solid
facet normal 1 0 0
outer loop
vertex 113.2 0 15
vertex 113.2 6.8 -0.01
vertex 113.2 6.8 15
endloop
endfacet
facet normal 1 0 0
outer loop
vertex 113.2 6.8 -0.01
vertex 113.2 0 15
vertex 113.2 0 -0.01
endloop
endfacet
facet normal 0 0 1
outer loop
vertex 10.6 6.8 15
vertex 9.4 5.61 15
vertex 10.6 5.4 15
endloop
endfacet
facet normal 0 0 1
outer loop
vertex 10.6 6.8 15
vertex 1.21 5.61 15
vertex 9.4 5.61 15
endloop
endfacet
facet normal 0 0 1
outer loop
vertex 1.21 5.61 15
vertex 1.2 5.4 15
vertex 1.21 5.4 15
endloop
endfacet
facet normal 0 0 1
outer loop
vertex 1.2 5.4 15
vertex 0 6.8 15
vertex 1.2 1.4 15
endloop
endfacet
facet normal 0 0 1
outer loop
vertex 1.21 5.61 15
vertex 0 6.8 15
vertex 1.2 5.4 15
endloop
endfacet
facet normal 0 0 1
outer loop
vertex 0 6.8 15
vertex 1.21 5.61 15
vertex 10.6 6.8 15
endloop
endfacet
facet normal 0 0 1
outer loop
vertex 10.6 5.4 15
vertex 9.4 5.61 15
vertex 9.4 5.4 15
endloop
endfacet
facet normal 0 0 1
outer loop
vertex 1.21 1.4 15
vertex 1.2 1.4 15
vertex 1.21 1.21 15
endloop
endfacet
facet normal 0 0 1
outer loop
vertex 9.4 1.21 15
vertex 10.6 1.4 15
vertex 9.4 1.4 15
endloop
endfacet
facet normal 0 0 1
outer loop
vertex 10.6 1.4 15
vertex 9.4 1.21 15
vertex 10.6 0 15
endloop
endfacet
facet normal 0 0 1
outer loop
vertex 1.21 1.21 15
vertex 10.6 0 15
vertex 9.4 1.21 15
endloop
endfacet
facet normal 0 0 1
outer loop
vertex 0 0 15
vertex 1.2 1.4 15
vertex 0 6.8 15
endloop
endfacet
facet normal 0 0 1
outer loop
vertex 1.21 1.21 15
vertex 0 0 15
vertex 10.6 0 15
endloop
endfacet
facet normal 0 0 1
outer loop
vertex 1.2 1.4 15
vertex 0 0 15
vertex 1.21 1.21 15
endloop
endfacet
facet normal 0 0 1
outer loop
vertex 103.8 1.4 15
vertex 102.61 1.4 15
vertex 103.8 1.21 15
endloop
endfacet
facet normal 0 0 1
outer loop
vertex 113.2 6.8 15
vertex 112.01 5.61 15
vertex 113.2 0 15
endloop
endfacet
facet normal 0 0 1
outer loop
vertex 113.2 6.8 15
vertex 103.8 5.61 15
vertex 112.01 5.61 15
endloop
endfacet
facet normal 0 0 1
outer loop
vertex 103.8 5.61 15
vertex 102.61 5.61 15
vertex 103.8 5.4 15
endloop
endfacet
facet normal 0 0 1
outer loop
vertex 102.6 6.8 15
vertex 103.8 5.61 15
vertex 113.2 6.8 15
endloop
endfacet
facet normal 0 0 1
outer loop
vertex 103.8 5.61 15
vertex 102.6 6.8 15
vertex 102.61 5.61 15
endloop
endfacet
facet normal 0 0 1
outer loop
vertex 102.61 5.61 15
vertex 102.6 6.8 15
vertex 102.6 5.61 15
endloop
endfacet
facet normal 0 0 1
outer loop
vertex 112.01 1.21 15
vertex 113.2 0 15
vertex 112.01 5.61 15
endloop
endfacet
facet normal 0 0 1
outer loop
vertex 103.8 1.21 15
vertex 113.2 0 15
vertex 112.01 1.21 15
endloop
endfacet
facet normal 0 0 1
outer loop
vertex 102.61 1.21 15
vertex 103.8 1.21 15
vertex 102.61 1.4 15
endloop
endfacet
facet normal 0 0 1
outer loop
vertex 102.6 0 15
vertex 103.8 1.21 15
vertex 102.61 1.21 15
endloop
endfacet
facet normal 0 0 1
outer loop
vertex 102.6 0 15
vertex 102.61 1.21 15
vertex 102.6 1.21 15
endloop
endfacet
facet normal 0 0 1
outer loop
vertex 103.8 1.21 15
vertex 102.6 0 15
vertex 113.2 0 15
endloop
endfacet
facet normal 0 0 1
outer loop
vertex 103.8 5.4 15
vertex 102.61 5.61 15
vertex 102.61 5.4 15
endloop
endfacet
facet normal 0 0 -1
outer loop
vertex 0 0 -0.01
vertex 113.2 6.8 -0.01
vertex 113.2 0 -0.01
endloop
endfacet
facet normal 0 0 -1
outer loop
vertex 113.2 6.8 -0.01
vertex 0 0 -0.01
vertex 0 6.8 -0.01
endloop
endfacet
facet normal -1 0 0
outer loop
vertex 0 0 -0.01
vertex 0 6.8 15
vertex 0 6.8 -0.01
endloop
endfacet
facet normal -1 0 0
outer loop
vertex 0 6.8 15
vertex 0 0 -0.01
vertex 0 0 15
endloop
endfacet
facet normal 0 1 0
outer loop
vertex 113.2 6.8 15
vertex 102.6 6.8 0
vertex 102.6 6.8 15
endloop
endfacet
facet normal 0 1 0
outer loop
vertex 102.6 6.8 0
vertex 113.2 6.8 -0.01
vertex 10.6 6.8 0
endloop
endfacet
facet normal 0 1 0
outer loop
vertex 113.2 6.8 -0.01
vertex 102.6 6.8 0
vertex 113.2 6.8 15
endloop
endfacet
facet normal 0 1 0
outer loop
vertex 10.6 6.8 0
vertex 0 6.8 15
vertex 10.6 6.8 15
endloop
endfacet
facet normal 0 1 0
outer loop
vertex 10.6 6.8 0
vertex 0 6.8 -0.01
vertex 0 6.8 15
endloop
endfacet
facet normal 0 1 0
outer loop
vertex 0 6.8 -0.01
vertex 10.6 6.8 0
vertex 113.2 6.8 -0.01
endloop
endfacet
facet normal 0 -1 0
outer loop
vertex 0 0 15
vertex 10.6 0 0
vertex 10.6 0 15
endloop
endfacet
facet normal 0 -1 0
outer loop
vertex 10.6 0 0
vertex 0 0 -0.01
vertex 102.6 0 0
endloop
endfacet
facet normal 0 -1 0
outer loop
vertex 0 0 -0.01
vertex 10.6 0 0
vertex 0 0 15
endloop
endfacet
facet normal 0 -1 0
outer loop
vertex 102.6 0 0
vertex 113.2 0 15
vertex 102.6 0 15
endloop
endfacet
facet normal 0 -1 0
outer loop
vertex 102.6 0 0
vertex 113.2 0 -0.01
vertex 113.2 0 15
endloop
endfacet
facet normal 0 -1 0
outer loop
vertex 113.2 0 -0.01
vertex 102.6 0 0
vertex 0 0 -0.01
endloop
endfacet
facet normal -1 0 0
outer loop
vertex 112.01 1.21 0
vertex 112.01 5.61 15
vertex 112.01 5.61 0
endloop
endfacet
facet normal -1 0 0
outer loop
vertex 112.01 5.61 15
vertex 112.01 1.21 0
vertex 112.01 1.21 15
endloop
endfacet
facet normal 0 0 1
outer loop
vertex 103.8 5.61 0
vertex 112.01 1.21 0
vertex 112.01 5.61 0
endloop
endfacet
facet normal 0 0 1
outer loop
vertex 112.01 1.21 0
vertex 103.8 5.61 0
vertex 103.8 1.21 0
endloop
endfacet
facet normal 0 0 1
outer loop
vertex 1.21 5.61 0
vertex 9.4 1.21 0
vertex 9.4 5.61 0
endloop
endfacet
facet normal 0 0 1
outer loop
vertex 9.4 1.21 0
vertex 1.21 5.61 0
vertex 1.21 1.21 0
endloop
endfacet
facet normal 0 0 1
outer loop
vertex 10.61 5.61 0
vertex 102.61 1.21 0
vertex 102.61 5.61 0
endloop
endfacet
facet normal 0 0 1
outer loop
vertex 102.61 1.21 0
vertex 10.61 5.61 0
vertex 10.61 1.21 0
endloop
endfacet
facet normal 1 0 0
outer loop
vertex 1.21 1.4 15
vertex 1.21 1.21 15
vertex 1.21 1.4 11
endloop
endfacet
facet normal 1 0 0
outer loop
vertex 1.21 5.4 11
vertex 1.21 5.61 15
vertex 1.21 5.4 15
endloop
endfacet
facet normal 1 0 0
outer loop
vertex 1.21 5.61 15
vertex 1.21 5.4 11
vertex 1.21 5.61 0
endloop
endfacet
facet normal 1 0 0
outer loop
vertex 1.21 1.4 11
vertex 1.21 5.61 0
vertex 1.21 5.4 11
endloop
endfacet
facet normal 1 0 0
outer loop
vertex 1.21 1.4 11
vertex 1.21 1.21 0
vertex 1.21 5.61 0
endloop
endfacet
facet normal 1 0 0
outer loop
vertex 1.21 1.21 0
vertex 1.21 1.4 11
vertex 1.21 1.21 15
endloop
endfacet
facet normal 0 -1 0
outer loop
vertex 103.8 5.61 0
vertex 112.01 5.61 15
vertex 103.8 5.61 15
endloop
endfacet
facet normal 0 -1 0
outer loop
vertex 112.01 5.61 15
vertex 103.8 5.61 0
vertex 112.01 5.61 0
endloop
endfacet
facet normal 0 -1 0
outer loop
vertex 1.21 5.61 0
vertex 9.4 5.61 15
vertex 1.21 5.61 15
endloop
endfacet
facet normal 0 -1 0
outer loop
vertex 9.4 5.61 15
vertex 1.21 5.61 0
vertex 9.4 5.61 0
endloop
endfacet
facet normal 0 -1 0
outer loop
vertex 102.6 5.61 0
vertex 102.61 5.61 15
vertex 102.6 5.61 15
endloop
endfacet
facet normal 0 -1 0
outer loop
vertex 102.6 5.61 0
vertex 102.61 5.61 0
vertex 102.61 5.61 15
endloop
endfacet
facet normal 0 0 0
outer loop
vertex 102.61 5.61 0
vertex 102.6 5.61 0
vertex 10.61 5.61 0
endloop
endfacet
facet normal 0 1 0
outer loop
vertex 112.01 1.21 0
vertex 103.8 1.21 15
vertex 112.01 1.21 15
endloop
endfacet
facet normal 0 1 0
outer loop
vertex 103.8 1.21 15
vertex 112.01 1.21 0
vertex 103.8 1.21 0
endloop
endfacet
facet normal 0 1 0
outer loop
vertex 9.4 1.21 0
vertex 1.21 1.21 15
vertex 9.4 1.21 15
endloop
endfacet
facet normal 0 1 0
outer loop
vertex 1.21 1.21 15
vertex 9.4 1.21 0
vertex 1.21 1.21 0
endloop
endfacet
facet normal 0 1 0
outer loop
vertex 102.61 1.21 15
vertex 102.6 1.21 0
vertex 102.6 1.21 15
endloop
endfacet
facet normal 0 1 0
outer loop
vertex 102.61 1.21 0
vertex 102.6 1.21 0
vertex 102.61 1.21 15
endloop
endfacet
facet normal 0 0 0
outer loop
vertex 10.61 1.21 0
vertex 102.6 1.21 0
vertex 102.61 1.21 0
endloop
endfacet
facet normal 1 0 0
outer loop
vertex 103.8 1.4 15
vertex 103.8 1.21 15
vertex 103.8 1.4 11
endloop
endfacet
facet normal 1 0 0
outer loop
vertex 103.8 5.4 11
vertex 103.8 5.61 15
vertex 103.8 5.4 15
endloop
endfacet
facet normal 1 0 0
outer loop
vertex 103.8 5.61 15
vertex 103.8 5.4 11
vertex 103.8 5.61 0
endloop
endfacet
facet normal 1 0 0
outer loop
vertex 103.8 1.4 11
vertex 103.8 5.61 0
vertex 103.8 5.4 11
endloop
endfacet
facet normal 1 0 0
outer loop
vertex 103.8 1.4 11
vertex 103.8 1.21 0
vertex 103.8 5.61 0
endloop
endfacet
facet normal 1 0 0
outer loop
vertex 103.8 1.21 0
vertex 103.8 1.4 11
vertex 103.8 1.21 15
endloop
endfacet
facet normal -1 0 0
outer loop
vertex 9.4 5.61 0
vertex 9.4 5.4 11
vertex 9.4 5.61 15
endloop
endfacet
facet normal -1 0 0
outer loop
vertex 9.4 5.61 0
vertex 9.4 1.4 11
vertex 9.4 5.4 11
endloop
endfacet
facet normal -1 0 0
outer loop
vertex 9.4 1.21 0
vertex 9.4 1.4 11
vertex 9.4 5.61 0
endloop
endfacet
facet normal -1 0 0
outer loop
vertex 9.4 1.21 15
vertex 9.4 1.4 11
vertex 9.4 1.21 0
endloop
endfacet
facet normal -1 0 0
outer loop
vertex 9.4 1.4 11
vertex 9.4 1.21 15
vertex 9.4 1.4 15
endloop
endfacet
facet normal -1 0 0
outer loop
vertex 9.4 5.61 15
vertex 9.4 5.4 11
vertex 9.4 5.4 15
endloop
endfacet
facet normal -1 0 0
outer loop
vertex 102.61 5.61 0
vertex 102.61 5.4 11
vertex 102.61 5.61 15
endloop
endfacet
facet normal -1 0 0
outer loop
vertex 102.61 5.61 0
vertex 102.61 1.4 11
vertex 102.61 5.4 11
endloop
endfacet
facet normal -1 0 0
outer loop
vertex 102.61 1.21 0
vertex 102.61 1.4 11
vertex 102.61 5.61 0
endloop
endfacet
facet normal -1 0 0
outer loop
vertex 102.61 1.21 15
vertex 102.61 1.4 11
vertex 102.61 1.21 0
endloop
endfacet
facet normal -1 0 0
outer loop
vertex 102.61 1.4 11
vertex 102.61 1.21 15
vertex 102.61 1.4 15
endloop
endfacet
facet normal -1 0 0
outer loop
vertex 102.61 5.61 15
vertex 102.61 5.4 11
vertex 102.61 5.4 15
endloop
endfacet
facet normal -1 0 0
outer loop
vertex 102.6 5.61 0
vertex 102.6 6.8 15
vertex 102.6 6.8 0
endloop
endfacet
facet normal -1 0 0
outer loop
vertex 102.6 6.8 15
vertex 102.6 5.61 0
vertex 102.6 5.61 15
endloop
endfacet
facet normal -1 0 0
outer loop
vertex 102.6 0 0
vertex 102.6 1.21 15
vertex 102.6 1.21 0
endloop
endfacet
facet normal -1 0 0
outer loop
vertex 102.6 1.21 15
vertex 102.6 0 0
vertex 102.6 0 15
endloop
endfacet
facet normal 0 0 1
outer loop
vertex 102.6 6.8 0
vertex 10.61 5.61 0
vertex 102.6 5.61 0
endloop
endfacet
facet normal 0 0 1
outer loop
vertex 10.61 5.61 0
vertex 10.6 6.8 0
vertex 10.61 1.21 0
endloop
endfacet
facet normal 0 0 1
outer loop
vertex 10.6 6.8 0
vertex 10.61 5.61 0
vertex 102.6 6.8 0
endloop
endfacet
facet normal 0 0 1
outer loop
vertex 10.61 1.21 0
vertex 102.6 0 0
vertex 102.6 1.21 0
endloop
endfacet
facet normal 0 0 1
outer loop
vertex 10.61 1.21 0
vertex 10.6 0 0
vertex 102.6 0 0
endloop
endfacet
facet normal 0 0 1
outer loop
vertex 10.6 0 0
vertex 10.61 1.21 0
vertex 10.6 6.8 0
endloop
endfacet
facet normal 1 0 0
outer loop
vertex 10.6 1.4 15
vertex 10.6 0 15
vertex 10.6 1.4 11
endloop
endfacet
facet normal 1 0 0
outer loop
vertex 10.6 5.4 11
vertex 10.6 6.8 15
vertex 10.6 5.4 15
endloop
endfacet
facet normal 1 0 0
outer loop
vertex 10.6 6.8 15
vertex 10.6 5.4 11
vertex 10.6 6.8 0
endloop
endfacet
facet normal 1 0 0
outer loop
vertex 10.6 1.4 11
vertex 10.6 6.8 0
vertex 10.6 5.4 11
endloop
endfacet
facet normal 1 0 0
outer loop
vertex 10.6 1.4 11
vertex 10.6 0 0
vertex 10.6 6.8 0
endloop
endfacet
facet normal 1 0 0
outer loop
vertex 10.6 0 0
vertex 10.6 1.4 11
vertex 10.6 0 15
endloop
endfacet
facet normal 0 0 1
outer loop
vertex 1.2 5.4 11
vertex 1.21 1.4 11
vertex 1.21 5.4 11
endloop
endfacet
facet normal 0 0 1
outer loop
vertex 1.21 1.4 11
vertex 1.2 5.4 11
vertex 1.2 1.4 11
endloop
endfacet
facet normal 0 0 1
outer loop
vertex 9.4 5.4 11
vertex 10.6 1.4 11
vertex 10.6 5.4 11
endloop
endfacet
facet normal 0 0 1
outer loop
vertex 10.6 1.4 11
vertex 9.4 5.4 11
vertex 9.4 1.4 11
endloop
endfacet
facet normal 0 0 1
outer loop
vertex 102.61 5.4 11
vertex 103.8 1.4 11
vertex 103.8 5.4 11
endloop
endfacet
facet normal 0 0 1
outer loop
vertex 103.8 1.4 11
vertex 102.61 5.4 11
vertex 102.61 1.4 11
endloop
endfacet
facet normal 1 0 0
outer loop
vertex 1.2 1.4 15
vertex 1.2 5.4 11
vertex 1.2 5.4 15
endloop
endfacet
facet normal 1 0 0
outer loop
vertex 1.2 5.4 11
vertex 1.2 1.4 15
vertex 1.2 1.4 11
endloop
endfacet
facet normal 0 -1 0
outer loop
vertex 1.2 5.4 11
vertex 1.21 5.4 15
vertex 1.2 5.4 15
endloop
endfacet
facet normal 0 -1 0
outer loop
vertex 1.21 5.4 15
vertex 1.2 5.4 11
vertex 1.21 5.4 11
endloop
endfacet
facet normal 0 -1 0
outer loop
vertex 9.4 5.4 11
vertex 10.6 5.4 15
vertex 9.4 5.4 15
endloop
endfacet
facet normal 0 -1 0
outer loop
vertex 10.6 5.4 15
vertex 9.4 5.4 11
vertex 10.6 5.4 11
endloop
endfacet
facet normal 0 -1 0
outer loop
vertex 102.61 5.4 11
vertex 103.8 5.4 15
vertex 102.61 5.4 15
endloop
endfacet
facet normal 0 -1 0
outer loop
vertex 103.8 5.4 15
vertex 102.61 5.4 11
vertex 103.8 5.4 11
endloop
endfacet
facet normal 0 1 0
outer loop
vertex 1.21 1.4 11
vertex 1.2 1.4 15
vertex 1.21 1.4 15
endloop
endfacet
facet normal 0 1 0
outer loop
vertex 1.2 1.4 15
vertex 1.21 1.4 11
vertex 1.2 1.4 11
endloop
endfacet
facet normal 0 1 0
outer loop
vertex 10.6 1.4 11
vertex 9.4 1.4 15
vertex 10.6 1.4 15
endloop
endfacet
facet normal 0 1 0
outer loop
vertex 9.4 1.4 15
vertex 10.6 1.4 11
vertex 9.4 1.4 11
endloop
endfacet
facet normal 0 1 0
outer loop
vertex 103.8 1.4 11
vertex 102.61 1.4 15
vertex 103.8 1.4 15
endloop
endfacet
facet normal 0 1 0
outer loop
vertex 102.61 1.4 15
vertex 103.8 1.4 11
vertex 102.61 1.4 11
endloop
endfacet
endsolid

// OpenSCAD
// file: ../Base/Boxes.scad
// Fischertechnik Box Foundation
// Pre-designed Boxes

use <Constants.scad>

include <PlacementOptions.scad>

box190Width = 190;
box190Depth = 130;
box130Width = 130;
box130Depth = 95;

// Values are from an original ec3 box
topBottomDifference = 1.5;
outerHeight = 40;
innerHeight = 38.2;
baseThickness = outerHeight - innerHeight;
stackExcess = 5.7;
radius = 3.5;
wallThickness = 1.5;
tolerance = 0.2;
stackOffset = innerHeight - stackExcess;

boxUsageHeight = stackOffset;
boxWallThickness = wallThickness;
boxBaseThickness = baseThickness;
boxWebWidth = 3.0;

// getBoxWallThickness()
// Gets the wall thickness of a Fischertechnik Box
function getBoxWallThickness() = boxWallThickness;

// getBoxUsageHeight()
// Gets the usable height of a Fischertechnik box
function getBoxUsageHeight() = boxUsageHeight;

// getBoxInnerHeight()
// Gets the inner height of a Fischertechnik box, including the stack excess
function getBoxInnerHeight() = innerHeight;

// getBoxBaseThickness()
// Gets the thickness of the Fischertechnik box base.
function getBoxBaseThickness() = boxBaseThickness;

// getBoxWebWidth()
// Gets the width of a box web
function getBoxWebWidth() = boxWebWidth;

// getBox190Space()
// Gets the usable inner space of a Box 190 as an x/y-list
function getBox190Space() = [
    box190Width - 2*getBoxWallThickness() - topBottomDifference, 
    box190Depth - 2*getBoxWallThickness() - topBottomDifference ];

// BoxBase(width, depth)
// Creates an empty stackable Fischertechnik compatible box
// width = Outer width of the box (190, 130, ...)
// depth = Outer depth of the box (130, 95, ...)

module BoxBase(width, depth, height=outerHeight) {    
    thinPlate = 0.01;

    innerHeight = height - baseThickness;    
    
    module BodyPlate(width, depth) {
        translate([radius, radius])
        hull() {
            w = width-2*radius;
            d = depth-2*radius;
            cube([w, d, thinPlate]);
            cylinder(thinPlate, r=radius, $fn=getFragments());
            translate([w, 0])
                cylinder(thinPlate, r=radius, $fn=getFragments());
            translate([w, d])
                cylinder(thinPlate, r=radius, $fn=getFragments());
            translate([0, d])
                cylinder(thinPlate, r=radius, $fn=getFragments());
        }
    }
    
    module Body(tolerance=tolerance) {
        hull() {
            // Bottom with tolerance to fit into the original boxes when stacked
            translate([-wallThickness+tolerance, -wallThickness+tolerance, -baseThickness])
                BodyPlate(width-topBottomDifference-2*tolerance, depth-topBottomDifference-2*tolerance);
            
            // Top
            translate([-wallThickness-topBottomDifference/2, -wallThickness-topBottomDifference/2, innerHeight-thinPlate])
                BodyPlate(width, depth);
         }
    }

    module Cutoff() {
        hull() {
            coWidth = width - 2*wallThickness;
            coDepth = depth - 2*wallThickness;
            
            // Bottom
            BodyPlate(coWidth-topBottomDifference, coDepth-topBottomDifference);

            // Top
            translate([-topBottomDifference/2, -topBottomDifference/2, innerHeight+thinPlate]) 
                BodyPlate(coWidth, coDepth);
        }
    }
    
    difference() {        
        Body();
        Cutoff();
        stackOffset = innerHeight - stackExcess;
        translate([0, 0, stackOffset + baseThickness])
            Body(tolerance=0);
    }
}

// Creates the Fischertechnik empty box 130x190 mm and places it at position 0,0
// 190x130 are the outer sizes, the inner space is slightly smaller. Use getBox190Space() to get the inner sizes.
// The box is positioned that the usable inner space is at the 0,0,0 position. The

module Box190() {
    BoxBase(box190Width, box190Depth);
}

// Gets the usable inner space of a Box 130 as an x/y-list
function getBox130Space() = [
    box130Width - 2*getBoxWallThickness() - topBottomDifference, 
    box130Depth - 2*getBoxWallThickness() - topBottomDifference ];

// Creates the Fischertechnik empty box 95x130 mm and places it at position 0,0
// 190x130 are the outer sizes, the inner space is slightly smaller. Use getBox190Space() to get the inner sizes.
// The box is positioned that the usable inner space is at the 0,0,0 position. The

module Box130() {
    BoxBase(box130Width, box130Depth);
}

// Creates a web at the specified box walls
// corner 0 = LowerLeft, 1 = UpperLeft, 2 = UpperRight, 3 = LowerRight
// side 0 = LeftOfCorner, 1 = RightOfCorner
// distance = Distance in mm from the corner
// boxSpace = inner width and depth of the box (default: Box 190)
// webWidth = length of the web (default is 3 mms)
// webThickness = thickness of the web (default is 1 mm)

module BoxWeb(corner, side, distance, boxSpace=getBox190Space(), webWidth=getBoxWebWidth(), webThickness=1.0) {
    sink = getBoxWallThickness()/2;

    width = (corner % 2 == 0) ? 
            (side == LeftOfCorner ? webWidth : webThickness) :
            (side == LeftOfCorner ? webThickness : webWidth);

    depth = (corner % 2 == 0) ? 
            (side == RightOfCorner ? webWidth : webThickness) :
            (side == RightOfCorner ? webThickness : webWidth);
    
    xDiff = corner == LowerLeft ? 
                (side == LeftOfCorner ? -sink : distance) :
            (corner == UpperLeft ?                
                (side == LeftOfCorner ? distance : -sink) :
            (corner == UpperRight ?
                (side == LeftOfCorner ? boxSpace.x-webWidth+sink : boxSpace.x-distance-webThickness) :
                (side == LeftOfCorner ? boxSpace.x-distance-webThickness: boxSpace.x-webWidth+sink)));

    yDiff = corner == LowerLeft ? 
                (side == RightOfCorner ? -sink : distance) :
            (corner == UpperLeft ?
                (side == RightOfCorner ? boxSpace.y-distance : boxSpace.y-webWidth+sink) :
            (corner == UpperRight ?
                (side == RightOfCorner ? boxSpace.y-webWidth+sink : boxSpace.y-distance) :
                (side == RightOfCorner ? distance : -sink)));
    
    translate([xDiff, yDiff, -getExcess()])
        cube([width, depth, boxUsageHeight + 2*getExcess()]);
}
// file: ../Base/Rotation.scad
// Fischertechnik Box Foundation
// Geometry Helpers Rotation

include <PlacementOptions.scad>

// getRotatedSpace(space, rotation=NoRotation)
// Rotates the space dependent on the specified rotation

function getRotatedSpace(space, rotation=NoRotation) = [
    (rotation == Rotate90 || rotation == Rotate270) ? space.y : space.x,
    (rotation == Rotate90 || rotation == Rotate270) ? space.x : space.y
];

// Rotates the given space around the fixed left lower corner
// space = the space the children needs as width/depth list [width,depth]
// rotation = 0 Rotate0 degrees, 1 Rotate90 degrees, 2 Rotate180 degrees, 3 Rotate270 degrees (equivalent to -90)

module RotateFix(space, rotation=NoRotation) {
    dy = (rotation == Rotate0 || rotation == Rotate270) ? 0 :
        (rotation == Rotate90) ? space.x :
        space.y;
    dx = (rotation < Rotate180) ? 0 :
        (rotation == Rotate180) ? space.x :
        space.y;
    
    translate([dx, dy, 0])
        rotate([0, 0, rotations[rotation]])
            children();
}
// file: ../Base/Alignment.scad
// Fischertechnik Box Foundation
// Geometry Helpers Alignment

include <PlacementOptions.scad>

// getAlignedX(elementWidth, spaceWidth, align=AlignRight, offset=0)
// Gets the aligned X offset of an element with the given
// width in the given space.
// elementWidth = The width of the element to positon
// spaceWidth = The space where the element should be aligned
// align = 0 AlignLeft, 1 AlignCenter, 2 AlignRight
// offset = an optional offset from the aligned position. When
// aligned left or centered, then positive values are in X direction.
// When aligned right then positive values are in negative X direction.

function getAlignedX(elementWidth, spaceWidth, align=AlignRight, offset=0) =
    (align == AlignLeft) ?
        offset :
        ((align == AlignCenter) ?
        (spaceWidth - elementWidth)/2 + offset :
        spaceWidth - offset - elementWidth);

// getAlignedY(elementDepth, spaceDepth, align=AlignTop, offset=0)
// Gets the aligned Y offset of an element with the given
// depth in the given space.
// elementDepth = The depth of the element to positon
// spaceDepth = The space where the element should be aligned
// align = 0 AlignBottom, 1 AlignCenter, 2 AlignTop
// offset = an optional offset from the aligned position. When
// aligned bottom or centered, then positive values are in Y direction.
// When aligned top then positive values are in negative Y direction.

function getAlignedY(elementDepth, spaceDepth, align=AlignTop, offset=0) =
    (align == AlignBottom) ?
        offset :
        ((align == AlignCenter) ?
        (spaceDepth - elementDepth)/2 + offset :
        spaceDepth - offset - elementDepth);
// file: ../Base/PlacementOptions.scad
// Fischertechnik Box Foundation
// Placement Options

// Alignment
NoAlign = 0;
AlignLeft = 1;
AlignBottom = 2;
AlignCenter = 3;
AlignRight = 4;
AlignTop = 5;

// Element rotation degree steps
rotations = [0, -90, -180, -270];

// Rotation
NoRotation = 0;
Rotate0 = 0;
Rotate90 = 1;
Rotate180 = 2;
Rotate270 = 3;

// Docking (seen from above)
NoDock = -1;
DockLeft = 0;
DockTop = 1;
DockRight = 2;
DockCorner = 2;
DockBottom = 3;

// Web corners
LowerLeft = 0;
UpperLeft = 1;
UpperRight = 2;
LowerRight = 3;

// Web position relative to corner
LeftOfCorner = 0;
RightOfCorner = 1;
// file: ../Base/Placement.scad
// Fischertechnik Box Foundation
// Geometry Helpers Placement

use <Constants.scad>
use <Alignment.scad>
use <Rotation.scad>
use <Boxes.scad>

include <PlacementOptions.scad>

// Place(x=0, y=0, elementSpace=[0,0], alignX=AlignLeft, alignY=AlignBottom, rotation=Rotate0, boxSpace=getBox190Space())
// Places the child at the specified position
// y = Y-Position. This is a relative position when an X aligment is specified.
// x = X-Position. This is a relative position when an Y aligment is specified.
// elementSpace = space of the element to be placed [x,y]
// alignX = -1=NoAlign, 0 AlignLeft, 1 AlignCenter, 3 AlignRight (elementSpace and boxSpace required!)
// alignY = -1=NoAlign, 2 AlignBottom, 1 AlignCenter, 4 AlignTop (elementSpace and boxSpace required!)
// rotation = 0 Rotate0 0 degrees, 1 Rotate90 90 degrees, 
// 2 Rotate180 180 degrees, 3 Rotate270 270 degrees (equivalent to -90)
// boxSpace = Inner space of the box where the placement occurs [x,y] - default is Box 190x130 inner space

module Place(x=0, y=0, elementSpace=[0,0], 
  alignX=AlignLeft, alignY=AlignBottom, 
  rotation=NoRotation, boxSpace=getBox190Space()) {

    module Position(x, y, space, rotation=Rotate0) {
        translate([x, y, 0])
            RotateFix(space, rotation)
                children();
    }

    space = getRotatedSpace(elementSpace, rotation);
    alignedX = getAlignedX(space.x, boxSpace.x, alignX, x);
    alignedY = getAlignedY(space.y, boxSpace.y, alignY, y);
    Position(alignedX, alignedY, elementSpace, rotation)
        children();
}

// Center(space=getBox130Space(), elementSpace=[0,0])
// space = Space where the children is centered. For cylinder use centered=true and no elementSpace.
// elementSpace = space of the element to be centered [x,y]

module Center(space=getBox190Space(), elementSpace=[0,0]) {
    Place(elementSpace=elementSpace, boxSpace=space, alignX=AlignCenter, alignY=AlignCenter)
        children();
}

// CenterHorizontal(width=0, y=0, offset=0, space=getBox130Space())
// width = Width of the element to be placed.
// y = Y position of the element
// offset = Offset from the center position (negative will be left of the center)
// space = Space where the element is placed

module CenterHorizontal(width=0, y=0, offset=0, space=getBox190Space()) {
    Place(x=offset, y=y, elementSpace=[width, 0], boxSpace=space, alignX=AlignCenter)
        children(0);
}

// CenterVertical(depth=0, x=0, offset=0, space=getBox130Space())
// depth = Depth of the element to be placed.
// x = X position of the element
// offset = Offset from the center position (negative will be down of the center)
// space = Space where the element is placed

module CenterVertical(depth=0, x=0, offset=0, space=getBox190Space()) {
    Place(x=x, y=offset, elementSpace=[0, depth], boxSpace=space, alignY=AlignCenter)
        children(0);
}

// getIsVertical(align)
// True if the specified alignment needs a vertical orientation for a divider (AlignRight, AlignLeft)

function getIsVertical(align) = (align == AlignRight || align == AlignLeft);

// getIsHorizontal(align)
// True if the specified alignment needs a horizontal orientation for a divider (AlignTop, AlignBottom)

function getIsHorizontal(align) = (align == AlignTop || align == AlignBottom);
// file: ../Base/Constants.scad
// Fischertechnik Box Foundation
// Constants

// Constant values necessary for multiple elements

// Base constants
dividerThickness = 1.2;
excess = 0.01;
fragments = 90;
tolerance = 0.8;

// Gets the thickness of a divider 
function getDividerThickness() = dividerThickness;

// Gets the excess that is used to merge walls into each other
function getExcess() = excess;

// Gets amount of fragments of a cylinder
function getFragments() = fragments;

// Gets the inner tolerance of a frame to each side
function getTolerance() = tolerance;


// Fischertechnik specific constants
axisDiameter = 4;
axisBottomDiameter = axisDiameter + 1;
standardEdgeDistance = 2.5;
standardWebDistance = 11.5;
standardCornerLength = 15;
tubeWallFactor = 0.8;
smallPartsFrameHeight = 20;

// Gets axis diameter
function getAxisDiameter() = axisDiameter;

// Gets axis bottom diameter for thicker part at the bottom
function getAxisBottomDiameter() = axisBottomDiameter;

// gets the standard distance to the wall of the box for dockable frames with webs
function getStandardEdgeDistance() = standardEdgeDistance;

// gets the standard distance of each web to the corner of the dockable frame
function getStandardWebDistance() = standardWebDistance;

// gets the standard length of the corner walls of a dockable frame
function getStandardCornerLength() = standardCornerLength;

// gets the wall thickness of a tube.
function getTubeWallThickness() = tubeWallFactor * getDividerThickness();

// gets the frame height for docked small parts boxes.
function getSmallPartsFrameHeight() = smallPartsFrameHeight;
// main file
// Fischertechnik Box Library
// Frame for differential gearbox (/)default 110 mm)
// 31043

use <../ModelBase/Complex.scad>

/* [Element Parameters] */
length = 110;   // [110,120]

// getFrameDifferentialGearboxSpace()
// Gets the width (.x) and depth (.y) of the differential gearbox frame.

function getFrameDifferentialGearboxSpace(length=length) = getFrameAxisSpace(length);

// FrameDifferentialGearbox()
// Holder for differential gearbox.
// length = length of the axis of the diferential gearbox (default is 110)

module FrameDifferentialGearbox(length=length) {
    FrameAxis(length);
}

// Test
color("lightgray")
FrameDifferentialGearbox(length);
